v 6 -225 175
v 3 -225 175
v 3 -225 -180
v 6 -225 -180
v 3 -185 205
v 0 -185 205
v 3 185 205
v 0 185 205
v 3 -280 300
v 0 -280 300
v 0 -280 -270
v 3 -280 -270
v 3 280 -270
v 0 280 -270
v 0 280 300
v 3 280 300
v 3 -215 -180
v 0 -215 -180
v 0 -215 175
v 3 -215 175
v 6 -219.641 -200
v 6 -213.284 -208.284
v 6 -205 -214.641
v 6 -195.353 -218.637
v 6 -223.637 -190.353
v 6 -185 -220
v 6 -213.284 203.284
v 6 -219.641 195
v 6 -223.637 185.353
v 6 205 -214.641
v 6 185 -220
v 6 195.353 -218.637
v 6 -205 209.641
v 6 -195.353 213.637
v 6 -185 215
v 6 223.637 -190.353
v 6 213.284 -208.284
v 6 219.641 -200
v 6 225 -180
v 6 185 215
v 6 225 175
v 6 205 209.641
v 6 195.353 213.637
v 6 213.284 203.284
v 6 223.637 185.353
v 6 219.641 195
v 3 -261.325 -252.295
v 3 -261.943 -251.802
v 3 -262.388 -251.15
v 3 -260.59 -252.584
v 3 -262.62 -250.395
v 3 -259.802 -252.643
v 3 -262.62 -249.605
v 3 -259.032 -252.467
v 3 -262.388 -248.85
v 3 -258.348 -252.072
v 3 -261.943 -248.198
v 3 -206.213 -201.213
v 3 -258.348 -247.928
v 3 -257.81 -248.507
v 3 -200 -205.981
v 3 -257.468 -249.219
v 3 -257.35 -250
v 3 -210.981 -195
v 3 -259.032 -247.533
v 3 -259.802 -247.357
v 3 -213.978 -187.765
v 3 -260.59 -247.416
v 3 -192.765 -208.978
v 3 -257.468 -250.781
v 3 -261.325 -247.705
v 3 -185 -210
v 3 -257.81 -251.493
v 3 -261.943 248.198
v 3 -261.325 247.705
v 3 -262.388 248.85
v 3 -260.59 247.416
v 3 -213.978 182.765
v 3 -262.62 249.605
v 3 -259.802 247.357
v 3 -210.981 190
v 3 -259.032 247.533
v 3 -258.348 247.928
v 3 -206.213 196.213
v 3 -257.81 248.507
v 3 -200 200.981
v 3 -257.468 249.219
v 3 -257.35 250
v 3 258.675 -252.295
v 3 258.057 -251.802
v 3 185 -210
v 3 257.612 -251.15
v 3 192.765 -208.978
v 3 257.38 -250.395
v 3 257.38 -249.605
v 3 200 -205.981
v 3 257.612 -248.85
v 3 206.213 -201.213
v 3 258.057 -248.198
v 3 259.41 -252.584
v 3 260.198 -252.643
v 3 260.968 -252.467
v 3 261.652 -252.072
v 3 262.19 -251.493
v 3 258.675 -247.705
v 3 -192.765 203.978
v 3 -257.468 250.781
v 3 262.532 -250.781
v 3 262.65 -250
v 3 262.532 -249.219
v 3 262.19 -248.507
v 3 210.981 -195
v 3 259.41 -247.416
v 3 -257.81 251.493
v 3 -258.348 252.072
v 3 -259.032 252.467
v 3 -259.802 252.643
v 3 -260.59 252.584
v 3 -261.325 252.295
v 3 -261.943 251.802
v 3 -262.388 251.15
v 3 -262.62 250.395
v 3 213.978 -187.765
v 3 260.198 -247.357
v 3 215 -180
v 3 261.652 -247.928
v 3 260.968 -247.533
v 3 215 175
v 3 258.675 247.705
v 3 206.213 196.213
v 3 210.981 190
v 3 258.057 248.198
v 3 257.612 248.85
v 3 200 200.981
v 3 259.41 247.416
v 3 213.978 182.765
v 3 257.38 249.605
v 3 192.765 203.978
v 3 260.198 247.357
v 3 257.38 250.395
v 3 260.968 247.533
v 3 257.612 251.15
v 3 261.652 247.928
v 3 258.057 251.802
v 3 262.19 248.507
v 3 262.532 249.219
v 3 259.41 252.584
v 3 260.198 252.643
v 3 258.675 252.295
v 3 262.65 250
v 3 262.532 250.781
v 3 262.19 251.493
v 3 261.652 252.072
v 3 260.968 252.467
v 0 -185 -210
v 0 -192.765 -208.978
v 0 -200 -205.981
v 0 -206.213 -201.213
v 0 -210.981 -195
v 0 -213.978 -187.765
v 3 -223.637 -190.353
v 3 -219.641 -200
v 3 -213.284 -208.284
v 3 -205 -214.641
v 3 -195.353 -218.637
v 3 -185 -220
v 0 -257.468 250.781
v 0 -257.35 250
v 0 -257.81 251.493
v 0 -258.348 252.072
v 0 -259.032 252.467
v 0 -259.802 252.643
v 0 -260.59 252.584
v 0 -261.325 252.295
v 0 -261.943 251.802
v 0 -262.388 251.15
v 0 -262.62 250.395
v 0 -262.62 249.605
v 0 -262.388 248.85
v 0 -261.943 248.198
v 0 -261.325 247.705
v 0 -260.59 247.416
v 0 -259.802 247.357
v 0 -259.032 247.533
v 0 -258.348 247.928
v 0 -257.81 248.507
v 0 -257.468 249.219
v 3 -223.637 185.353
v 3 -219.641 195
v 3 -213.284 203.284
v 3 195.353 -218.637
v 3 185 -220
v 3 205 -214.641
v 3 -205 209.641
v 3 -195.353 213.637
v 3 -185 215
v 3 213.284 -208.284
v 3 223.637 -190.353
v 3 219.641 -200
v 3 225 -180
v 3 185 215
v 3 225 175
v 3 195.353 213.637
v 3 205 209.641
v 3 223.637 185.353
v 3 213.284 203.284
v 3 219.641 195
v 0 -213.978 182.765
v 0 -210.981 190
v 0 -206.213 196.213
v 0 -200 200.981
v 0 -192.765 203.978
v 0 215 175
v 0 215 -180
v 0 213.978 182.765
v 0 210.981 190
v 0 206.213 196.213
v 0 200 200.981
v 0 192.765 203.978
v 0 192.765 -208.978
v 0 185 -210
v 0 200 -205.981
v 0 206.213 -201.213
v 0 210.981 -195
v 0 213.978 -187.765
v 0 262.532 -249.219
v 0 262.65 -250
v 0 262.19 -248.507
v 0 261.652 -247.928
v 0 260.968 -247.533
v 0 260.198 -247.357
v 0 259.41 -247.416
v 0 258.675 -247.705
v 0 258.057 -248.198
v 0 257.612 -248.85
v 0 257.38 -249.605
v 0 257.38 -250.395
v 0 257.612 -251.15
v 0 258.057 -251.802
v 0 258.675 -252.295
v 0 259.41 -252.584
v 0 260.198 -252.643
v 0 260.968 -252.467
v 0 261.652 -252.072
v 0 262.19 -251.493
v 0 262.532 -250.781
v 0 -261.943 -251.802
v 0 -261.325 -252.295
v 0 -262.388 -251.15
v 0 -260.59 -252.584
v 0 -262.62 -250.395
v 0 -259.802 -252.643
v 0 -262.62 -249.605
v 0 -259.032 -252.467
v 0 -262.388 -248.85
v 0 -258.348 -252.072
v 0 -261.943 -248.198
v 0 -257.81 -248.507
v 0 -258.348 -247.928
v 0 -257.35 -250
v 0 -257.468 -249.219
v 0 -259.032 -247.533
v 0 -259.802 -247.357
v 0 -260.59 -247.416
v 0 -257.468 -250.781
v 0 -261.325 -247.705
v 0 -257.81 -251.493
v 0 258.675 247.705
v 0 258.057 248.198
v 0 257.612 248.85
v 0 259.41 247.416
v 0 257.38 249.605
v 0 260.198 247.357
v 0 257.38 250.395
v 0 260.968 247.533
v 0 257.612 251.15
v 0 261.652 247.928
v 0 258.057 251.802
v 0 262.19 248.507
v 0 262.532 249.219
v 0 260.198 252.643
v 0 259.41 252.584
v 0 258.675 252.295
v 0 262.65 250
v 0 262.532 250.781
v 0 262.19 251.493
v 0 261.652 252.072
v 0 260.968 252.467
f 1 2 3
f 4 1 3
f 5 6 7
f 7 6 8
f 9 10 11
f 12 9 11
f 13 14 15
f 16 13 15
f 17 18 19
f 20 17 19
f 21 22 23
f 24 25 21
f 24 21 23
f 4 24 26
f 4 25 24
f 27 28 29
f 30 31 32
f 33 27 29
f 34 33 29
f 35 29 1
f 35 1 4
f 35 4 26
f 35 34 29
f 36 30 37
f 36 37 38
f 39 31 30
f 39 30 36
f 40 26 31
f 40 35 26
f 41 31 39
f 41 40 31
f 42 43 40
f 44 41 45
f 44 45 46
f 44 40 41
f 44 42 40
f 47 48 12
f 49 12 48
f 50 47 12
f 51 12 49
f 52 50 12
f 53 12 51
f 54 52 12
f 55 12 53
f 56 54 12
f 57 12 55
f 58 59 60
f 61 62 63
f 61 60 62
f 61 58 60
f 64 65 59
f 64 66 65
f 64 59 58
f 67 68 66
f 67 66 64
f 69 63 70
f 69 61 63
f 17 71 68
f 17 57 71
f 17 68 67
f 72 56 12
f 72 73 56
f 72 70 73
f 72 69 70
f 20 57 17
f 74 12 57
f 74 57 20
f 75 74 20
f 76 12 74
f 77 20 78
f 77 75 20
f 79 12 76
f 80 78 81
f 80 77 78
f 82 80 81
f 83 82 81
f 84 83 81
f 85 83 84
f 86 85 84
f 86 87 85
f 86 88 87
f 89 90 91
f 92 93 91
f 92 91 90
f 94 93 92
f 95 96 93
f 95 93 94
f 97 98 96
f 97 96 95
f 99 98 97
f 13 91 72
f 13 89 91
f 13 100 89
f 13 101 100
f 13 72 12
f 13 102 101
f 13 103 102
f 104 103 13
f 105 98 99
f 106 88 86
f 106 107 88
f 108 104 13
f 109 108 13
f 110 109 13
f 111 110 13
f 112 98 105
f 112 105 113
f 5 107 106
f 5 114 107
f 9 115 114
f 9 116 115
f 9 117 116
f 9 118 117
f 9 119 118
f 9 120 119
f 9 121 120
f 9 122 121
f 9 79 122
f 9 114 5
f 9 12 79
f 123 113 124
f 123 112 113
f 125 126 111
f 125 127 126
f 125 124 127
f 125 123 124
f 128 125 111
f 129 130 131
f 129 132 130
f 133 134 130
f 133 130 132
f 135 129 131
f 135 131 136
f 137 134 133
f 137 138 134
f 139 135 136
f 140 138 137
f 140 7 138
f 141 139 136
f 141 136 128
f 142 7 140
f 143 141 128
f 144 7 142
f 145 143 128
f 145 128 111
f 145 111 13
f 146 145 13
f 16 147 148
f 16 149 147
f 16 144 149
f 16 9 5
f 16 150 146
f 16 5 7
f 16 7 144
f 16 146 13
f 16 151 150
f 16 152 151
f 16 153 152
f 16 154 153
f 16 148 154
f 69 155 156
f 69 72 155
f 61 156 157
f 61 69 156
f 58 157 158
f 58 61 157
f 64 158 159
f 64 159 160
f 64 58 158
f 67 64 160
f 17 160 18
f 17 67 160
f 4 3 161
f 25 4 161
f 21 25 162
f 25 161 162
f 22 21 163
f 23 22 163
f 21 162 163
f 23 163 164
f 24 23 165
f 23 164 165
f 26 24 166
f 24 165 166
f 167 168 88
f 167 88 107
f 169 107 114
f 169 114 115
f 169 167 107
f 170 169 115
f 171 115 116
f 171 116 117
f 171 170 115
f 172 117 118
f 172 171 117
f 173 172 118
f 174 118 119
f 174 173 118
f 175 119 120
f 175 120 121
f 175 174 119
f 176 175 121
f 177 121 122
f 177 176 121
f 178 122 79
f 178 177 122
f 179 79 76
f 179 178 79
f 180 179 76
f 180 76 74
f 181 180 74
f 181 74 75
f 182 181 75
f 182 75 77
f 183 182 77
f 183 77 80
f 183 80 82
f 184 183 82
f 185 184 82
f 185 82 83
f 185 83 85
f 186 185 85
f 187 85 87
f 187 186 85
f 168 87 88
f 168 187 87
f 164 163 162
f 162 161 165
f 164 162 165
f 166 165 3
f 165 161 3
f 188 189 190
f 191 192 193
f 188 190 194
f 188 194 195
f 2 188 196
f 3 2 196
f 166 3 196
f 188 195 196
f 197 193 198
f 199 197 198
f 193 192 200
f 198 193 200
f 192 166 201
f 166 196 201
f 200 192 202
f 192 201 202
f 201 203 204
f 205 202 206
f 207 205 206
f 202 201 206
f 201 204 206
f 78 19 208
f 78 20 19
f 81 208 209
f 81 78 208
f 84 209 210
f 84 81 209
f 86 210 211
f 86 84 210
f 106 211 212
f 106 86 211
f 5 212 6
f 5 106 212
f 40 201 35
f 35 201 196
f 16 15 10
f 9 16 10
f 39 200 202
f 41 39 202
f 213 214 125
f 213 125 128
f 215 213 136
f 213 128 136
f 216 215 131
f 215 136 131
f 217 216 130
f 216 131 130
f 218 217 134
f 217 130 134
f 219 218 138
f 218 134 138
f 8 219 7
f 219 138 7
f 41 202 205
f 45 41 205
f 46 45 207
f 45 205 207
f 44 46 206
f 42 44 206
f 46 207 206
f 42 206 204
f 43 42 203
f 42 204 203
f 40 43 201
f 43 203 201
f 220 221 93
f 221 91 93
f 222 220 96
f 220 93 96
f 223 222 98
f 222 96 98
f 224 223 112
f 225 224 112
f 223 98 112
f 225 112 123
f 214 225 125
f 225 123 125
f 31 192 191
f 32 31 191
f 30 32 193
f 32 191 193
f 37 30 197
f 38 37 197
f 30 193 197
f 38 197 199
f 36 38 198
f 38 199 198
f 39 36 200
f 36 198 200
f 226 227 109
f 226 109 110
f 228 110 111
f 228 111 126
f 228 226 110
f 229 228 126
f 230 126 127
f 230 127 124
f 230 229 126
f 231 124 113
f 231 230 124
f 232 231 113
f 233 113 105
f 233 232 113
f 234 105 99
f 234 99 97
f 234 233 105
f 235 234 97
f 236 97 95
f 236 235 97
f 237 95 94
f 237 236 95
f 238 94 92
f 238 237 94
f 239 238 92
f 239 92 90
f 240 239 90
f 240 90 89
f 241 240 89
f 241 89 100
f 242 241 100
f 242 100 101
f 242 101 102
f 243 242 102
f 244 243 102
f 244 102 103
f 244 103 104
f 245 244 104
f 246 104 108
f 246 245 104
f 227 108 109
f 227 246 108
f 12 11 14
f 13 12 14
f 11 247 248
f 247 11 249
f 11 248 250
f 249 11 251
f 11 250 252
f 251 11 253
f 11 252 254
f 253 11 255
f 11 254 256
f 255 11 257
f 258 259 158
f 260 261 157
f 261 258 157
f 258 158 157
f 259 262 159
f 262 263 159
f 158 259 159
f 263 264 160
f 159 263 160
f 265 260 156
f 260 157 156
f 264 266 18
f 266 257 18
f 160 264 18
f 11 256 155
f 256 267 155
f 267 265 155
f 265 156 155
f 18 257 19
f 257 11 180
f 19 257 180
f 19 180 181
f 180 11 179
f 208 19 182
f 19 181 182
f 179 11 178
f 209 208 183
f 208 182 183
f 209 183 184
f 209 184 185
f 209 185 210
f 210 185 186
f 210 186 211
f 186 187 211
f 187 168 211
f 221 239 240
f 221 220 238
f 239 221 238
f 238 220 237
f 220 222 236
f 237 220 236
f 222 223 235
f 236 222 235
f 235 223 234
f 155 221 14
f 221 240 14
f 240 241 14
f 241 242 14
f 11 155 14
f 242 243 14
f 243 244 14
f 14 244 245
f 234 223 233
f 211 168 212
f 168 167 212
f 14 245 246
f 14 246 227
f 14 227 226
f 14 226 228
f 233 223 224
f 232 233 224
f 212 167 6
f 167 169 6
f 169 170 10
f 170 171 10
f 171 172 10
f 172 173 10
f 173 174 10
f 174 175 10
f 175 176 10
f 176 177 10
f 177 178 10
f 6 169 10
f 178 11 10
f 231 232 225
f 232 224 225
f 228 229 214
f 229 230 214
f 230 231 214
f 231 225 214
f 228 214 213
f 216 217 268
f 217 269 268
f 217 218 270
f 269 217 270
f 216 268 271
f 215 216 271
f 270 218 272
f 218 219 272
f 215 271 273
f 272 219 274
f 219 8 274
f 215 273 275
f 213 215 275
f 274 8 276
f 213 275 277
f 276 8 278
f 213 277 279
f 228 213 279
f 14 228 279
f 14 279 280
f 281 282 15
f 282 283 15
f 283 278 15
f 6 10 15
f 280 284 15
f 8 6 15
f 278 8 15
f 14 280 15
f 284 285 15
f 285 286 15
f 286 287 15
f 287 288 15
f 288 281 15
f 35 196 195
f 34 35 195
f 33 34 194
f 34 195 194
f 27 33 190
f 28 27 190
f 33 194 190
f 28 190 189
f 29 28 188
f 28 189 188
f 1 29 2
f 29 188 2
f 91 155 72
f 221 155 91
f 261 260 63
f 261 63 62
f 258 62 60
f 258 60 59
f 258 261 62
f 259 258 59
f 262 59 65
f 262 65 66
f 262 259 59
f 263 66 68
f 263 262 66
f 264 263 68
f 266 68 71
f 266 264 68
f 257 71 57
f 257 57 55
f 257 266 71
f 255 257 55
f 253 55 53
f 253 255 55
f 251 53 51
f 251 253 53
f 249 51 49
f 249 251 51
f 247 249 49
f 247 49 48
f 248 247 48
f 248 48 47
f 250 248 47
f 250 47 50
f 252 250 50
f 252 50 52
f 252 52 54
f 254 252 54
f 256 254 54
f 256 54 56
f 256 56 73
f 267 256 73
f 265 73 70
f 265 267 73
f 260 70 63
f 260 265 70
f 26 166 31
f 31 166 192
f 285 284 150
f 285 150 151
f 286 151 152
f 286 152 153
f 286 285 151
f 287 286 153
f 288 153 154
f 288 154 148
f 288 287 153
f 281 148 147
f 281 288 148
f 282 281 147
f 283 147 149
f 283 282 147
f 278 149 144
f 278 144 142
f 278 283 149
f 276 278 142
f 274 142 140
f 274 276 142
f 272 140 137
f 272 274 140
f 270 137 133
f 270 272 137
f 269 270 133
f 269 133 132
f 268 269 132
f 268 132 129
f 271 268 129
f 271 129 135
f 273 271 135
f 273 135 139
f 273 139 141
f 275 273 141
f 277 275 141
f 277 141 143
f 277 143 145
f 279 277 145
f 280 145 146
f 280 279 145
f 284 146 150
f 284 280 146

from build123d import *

# Parameters (mm, degrees)
F0_W     = 540
F0_H     = 40
F0_R     = 2.65
F0_W_2   = 430
F0_H_2   = 415
F1_DEPTH = 3
F2_R     = 30
F4_DEPTH = 3


with BuildPart() as f1:
    # F0 (on Right) → F1 (new body)
    with BuildSketch(Plane.YZ):
        with Locations((0, 280)):
            Rectangle(F0_W, F0_H)
        Polygon((270, 260), (-270, 260), (-270, 300), (-280, 300), (-280, -260), (-280, -270), (280, -270), (280, -260), (280, 300), (270, 300), align=None)
        with Locations((-260, -250)):
            Circle(F0_R, mode=Mode.SUBTRACT)
        with Locations((260, -250)):
            Circle(F0_R, mode=Mode.SUBTRACT)
        with Locations((0, -2.5)):
            Rectangle(F0_W_2, F0_H_2, mode=Mode.SUBTRACT)
        with Locations((-260, 250)):
            Circle(F0_R, mode=Mode.SUBTRACT)
        with Locations((260, 250)):
            Circle(F0_R, mode=Mode.SUBTRACT)
    extrude(amount=F1_DEPTH)

    # F2
    f2_edges = [f1.edges().sort_by_distance(p)[0] for p in [
        (1.5, -215, 205),
        (1.5, 215, 205),
        (1.5, 215, -210),
        (1.5, -215, -210),
    ]]
    fillet(f2_edges, radius=F2_R)


with BuildPart() as f4:
    # F3 (on face) → F4 (new body)
    with BuildSketch(Plane.YZ.offset(3)):
        with BuildLine():
            ThreePointArc((-225, -180), (-213.2842712475, -208.2842712475), (-185, -220))
            Line((-185, -220), (185, -220))
            ThreePointArc((185, -220), (213.2842712475, -208.2842712475), (225, -180))
            Line((225, -180), (225, 175))
            ThreePointArc((225, 175), (213.2842712475, 203.2842712475), (185, 215))
            Line((185, 215), (-185, 215))
            ThreePointArc((-185, 215), (-213.2842712475, 203.2842712475), (-225, 175))
            Line((-225, 175), (-225, -180))
        make_face()
    extrude(amount=F4_DEPTH)


solid = Compound([f1.part, f4.part])
